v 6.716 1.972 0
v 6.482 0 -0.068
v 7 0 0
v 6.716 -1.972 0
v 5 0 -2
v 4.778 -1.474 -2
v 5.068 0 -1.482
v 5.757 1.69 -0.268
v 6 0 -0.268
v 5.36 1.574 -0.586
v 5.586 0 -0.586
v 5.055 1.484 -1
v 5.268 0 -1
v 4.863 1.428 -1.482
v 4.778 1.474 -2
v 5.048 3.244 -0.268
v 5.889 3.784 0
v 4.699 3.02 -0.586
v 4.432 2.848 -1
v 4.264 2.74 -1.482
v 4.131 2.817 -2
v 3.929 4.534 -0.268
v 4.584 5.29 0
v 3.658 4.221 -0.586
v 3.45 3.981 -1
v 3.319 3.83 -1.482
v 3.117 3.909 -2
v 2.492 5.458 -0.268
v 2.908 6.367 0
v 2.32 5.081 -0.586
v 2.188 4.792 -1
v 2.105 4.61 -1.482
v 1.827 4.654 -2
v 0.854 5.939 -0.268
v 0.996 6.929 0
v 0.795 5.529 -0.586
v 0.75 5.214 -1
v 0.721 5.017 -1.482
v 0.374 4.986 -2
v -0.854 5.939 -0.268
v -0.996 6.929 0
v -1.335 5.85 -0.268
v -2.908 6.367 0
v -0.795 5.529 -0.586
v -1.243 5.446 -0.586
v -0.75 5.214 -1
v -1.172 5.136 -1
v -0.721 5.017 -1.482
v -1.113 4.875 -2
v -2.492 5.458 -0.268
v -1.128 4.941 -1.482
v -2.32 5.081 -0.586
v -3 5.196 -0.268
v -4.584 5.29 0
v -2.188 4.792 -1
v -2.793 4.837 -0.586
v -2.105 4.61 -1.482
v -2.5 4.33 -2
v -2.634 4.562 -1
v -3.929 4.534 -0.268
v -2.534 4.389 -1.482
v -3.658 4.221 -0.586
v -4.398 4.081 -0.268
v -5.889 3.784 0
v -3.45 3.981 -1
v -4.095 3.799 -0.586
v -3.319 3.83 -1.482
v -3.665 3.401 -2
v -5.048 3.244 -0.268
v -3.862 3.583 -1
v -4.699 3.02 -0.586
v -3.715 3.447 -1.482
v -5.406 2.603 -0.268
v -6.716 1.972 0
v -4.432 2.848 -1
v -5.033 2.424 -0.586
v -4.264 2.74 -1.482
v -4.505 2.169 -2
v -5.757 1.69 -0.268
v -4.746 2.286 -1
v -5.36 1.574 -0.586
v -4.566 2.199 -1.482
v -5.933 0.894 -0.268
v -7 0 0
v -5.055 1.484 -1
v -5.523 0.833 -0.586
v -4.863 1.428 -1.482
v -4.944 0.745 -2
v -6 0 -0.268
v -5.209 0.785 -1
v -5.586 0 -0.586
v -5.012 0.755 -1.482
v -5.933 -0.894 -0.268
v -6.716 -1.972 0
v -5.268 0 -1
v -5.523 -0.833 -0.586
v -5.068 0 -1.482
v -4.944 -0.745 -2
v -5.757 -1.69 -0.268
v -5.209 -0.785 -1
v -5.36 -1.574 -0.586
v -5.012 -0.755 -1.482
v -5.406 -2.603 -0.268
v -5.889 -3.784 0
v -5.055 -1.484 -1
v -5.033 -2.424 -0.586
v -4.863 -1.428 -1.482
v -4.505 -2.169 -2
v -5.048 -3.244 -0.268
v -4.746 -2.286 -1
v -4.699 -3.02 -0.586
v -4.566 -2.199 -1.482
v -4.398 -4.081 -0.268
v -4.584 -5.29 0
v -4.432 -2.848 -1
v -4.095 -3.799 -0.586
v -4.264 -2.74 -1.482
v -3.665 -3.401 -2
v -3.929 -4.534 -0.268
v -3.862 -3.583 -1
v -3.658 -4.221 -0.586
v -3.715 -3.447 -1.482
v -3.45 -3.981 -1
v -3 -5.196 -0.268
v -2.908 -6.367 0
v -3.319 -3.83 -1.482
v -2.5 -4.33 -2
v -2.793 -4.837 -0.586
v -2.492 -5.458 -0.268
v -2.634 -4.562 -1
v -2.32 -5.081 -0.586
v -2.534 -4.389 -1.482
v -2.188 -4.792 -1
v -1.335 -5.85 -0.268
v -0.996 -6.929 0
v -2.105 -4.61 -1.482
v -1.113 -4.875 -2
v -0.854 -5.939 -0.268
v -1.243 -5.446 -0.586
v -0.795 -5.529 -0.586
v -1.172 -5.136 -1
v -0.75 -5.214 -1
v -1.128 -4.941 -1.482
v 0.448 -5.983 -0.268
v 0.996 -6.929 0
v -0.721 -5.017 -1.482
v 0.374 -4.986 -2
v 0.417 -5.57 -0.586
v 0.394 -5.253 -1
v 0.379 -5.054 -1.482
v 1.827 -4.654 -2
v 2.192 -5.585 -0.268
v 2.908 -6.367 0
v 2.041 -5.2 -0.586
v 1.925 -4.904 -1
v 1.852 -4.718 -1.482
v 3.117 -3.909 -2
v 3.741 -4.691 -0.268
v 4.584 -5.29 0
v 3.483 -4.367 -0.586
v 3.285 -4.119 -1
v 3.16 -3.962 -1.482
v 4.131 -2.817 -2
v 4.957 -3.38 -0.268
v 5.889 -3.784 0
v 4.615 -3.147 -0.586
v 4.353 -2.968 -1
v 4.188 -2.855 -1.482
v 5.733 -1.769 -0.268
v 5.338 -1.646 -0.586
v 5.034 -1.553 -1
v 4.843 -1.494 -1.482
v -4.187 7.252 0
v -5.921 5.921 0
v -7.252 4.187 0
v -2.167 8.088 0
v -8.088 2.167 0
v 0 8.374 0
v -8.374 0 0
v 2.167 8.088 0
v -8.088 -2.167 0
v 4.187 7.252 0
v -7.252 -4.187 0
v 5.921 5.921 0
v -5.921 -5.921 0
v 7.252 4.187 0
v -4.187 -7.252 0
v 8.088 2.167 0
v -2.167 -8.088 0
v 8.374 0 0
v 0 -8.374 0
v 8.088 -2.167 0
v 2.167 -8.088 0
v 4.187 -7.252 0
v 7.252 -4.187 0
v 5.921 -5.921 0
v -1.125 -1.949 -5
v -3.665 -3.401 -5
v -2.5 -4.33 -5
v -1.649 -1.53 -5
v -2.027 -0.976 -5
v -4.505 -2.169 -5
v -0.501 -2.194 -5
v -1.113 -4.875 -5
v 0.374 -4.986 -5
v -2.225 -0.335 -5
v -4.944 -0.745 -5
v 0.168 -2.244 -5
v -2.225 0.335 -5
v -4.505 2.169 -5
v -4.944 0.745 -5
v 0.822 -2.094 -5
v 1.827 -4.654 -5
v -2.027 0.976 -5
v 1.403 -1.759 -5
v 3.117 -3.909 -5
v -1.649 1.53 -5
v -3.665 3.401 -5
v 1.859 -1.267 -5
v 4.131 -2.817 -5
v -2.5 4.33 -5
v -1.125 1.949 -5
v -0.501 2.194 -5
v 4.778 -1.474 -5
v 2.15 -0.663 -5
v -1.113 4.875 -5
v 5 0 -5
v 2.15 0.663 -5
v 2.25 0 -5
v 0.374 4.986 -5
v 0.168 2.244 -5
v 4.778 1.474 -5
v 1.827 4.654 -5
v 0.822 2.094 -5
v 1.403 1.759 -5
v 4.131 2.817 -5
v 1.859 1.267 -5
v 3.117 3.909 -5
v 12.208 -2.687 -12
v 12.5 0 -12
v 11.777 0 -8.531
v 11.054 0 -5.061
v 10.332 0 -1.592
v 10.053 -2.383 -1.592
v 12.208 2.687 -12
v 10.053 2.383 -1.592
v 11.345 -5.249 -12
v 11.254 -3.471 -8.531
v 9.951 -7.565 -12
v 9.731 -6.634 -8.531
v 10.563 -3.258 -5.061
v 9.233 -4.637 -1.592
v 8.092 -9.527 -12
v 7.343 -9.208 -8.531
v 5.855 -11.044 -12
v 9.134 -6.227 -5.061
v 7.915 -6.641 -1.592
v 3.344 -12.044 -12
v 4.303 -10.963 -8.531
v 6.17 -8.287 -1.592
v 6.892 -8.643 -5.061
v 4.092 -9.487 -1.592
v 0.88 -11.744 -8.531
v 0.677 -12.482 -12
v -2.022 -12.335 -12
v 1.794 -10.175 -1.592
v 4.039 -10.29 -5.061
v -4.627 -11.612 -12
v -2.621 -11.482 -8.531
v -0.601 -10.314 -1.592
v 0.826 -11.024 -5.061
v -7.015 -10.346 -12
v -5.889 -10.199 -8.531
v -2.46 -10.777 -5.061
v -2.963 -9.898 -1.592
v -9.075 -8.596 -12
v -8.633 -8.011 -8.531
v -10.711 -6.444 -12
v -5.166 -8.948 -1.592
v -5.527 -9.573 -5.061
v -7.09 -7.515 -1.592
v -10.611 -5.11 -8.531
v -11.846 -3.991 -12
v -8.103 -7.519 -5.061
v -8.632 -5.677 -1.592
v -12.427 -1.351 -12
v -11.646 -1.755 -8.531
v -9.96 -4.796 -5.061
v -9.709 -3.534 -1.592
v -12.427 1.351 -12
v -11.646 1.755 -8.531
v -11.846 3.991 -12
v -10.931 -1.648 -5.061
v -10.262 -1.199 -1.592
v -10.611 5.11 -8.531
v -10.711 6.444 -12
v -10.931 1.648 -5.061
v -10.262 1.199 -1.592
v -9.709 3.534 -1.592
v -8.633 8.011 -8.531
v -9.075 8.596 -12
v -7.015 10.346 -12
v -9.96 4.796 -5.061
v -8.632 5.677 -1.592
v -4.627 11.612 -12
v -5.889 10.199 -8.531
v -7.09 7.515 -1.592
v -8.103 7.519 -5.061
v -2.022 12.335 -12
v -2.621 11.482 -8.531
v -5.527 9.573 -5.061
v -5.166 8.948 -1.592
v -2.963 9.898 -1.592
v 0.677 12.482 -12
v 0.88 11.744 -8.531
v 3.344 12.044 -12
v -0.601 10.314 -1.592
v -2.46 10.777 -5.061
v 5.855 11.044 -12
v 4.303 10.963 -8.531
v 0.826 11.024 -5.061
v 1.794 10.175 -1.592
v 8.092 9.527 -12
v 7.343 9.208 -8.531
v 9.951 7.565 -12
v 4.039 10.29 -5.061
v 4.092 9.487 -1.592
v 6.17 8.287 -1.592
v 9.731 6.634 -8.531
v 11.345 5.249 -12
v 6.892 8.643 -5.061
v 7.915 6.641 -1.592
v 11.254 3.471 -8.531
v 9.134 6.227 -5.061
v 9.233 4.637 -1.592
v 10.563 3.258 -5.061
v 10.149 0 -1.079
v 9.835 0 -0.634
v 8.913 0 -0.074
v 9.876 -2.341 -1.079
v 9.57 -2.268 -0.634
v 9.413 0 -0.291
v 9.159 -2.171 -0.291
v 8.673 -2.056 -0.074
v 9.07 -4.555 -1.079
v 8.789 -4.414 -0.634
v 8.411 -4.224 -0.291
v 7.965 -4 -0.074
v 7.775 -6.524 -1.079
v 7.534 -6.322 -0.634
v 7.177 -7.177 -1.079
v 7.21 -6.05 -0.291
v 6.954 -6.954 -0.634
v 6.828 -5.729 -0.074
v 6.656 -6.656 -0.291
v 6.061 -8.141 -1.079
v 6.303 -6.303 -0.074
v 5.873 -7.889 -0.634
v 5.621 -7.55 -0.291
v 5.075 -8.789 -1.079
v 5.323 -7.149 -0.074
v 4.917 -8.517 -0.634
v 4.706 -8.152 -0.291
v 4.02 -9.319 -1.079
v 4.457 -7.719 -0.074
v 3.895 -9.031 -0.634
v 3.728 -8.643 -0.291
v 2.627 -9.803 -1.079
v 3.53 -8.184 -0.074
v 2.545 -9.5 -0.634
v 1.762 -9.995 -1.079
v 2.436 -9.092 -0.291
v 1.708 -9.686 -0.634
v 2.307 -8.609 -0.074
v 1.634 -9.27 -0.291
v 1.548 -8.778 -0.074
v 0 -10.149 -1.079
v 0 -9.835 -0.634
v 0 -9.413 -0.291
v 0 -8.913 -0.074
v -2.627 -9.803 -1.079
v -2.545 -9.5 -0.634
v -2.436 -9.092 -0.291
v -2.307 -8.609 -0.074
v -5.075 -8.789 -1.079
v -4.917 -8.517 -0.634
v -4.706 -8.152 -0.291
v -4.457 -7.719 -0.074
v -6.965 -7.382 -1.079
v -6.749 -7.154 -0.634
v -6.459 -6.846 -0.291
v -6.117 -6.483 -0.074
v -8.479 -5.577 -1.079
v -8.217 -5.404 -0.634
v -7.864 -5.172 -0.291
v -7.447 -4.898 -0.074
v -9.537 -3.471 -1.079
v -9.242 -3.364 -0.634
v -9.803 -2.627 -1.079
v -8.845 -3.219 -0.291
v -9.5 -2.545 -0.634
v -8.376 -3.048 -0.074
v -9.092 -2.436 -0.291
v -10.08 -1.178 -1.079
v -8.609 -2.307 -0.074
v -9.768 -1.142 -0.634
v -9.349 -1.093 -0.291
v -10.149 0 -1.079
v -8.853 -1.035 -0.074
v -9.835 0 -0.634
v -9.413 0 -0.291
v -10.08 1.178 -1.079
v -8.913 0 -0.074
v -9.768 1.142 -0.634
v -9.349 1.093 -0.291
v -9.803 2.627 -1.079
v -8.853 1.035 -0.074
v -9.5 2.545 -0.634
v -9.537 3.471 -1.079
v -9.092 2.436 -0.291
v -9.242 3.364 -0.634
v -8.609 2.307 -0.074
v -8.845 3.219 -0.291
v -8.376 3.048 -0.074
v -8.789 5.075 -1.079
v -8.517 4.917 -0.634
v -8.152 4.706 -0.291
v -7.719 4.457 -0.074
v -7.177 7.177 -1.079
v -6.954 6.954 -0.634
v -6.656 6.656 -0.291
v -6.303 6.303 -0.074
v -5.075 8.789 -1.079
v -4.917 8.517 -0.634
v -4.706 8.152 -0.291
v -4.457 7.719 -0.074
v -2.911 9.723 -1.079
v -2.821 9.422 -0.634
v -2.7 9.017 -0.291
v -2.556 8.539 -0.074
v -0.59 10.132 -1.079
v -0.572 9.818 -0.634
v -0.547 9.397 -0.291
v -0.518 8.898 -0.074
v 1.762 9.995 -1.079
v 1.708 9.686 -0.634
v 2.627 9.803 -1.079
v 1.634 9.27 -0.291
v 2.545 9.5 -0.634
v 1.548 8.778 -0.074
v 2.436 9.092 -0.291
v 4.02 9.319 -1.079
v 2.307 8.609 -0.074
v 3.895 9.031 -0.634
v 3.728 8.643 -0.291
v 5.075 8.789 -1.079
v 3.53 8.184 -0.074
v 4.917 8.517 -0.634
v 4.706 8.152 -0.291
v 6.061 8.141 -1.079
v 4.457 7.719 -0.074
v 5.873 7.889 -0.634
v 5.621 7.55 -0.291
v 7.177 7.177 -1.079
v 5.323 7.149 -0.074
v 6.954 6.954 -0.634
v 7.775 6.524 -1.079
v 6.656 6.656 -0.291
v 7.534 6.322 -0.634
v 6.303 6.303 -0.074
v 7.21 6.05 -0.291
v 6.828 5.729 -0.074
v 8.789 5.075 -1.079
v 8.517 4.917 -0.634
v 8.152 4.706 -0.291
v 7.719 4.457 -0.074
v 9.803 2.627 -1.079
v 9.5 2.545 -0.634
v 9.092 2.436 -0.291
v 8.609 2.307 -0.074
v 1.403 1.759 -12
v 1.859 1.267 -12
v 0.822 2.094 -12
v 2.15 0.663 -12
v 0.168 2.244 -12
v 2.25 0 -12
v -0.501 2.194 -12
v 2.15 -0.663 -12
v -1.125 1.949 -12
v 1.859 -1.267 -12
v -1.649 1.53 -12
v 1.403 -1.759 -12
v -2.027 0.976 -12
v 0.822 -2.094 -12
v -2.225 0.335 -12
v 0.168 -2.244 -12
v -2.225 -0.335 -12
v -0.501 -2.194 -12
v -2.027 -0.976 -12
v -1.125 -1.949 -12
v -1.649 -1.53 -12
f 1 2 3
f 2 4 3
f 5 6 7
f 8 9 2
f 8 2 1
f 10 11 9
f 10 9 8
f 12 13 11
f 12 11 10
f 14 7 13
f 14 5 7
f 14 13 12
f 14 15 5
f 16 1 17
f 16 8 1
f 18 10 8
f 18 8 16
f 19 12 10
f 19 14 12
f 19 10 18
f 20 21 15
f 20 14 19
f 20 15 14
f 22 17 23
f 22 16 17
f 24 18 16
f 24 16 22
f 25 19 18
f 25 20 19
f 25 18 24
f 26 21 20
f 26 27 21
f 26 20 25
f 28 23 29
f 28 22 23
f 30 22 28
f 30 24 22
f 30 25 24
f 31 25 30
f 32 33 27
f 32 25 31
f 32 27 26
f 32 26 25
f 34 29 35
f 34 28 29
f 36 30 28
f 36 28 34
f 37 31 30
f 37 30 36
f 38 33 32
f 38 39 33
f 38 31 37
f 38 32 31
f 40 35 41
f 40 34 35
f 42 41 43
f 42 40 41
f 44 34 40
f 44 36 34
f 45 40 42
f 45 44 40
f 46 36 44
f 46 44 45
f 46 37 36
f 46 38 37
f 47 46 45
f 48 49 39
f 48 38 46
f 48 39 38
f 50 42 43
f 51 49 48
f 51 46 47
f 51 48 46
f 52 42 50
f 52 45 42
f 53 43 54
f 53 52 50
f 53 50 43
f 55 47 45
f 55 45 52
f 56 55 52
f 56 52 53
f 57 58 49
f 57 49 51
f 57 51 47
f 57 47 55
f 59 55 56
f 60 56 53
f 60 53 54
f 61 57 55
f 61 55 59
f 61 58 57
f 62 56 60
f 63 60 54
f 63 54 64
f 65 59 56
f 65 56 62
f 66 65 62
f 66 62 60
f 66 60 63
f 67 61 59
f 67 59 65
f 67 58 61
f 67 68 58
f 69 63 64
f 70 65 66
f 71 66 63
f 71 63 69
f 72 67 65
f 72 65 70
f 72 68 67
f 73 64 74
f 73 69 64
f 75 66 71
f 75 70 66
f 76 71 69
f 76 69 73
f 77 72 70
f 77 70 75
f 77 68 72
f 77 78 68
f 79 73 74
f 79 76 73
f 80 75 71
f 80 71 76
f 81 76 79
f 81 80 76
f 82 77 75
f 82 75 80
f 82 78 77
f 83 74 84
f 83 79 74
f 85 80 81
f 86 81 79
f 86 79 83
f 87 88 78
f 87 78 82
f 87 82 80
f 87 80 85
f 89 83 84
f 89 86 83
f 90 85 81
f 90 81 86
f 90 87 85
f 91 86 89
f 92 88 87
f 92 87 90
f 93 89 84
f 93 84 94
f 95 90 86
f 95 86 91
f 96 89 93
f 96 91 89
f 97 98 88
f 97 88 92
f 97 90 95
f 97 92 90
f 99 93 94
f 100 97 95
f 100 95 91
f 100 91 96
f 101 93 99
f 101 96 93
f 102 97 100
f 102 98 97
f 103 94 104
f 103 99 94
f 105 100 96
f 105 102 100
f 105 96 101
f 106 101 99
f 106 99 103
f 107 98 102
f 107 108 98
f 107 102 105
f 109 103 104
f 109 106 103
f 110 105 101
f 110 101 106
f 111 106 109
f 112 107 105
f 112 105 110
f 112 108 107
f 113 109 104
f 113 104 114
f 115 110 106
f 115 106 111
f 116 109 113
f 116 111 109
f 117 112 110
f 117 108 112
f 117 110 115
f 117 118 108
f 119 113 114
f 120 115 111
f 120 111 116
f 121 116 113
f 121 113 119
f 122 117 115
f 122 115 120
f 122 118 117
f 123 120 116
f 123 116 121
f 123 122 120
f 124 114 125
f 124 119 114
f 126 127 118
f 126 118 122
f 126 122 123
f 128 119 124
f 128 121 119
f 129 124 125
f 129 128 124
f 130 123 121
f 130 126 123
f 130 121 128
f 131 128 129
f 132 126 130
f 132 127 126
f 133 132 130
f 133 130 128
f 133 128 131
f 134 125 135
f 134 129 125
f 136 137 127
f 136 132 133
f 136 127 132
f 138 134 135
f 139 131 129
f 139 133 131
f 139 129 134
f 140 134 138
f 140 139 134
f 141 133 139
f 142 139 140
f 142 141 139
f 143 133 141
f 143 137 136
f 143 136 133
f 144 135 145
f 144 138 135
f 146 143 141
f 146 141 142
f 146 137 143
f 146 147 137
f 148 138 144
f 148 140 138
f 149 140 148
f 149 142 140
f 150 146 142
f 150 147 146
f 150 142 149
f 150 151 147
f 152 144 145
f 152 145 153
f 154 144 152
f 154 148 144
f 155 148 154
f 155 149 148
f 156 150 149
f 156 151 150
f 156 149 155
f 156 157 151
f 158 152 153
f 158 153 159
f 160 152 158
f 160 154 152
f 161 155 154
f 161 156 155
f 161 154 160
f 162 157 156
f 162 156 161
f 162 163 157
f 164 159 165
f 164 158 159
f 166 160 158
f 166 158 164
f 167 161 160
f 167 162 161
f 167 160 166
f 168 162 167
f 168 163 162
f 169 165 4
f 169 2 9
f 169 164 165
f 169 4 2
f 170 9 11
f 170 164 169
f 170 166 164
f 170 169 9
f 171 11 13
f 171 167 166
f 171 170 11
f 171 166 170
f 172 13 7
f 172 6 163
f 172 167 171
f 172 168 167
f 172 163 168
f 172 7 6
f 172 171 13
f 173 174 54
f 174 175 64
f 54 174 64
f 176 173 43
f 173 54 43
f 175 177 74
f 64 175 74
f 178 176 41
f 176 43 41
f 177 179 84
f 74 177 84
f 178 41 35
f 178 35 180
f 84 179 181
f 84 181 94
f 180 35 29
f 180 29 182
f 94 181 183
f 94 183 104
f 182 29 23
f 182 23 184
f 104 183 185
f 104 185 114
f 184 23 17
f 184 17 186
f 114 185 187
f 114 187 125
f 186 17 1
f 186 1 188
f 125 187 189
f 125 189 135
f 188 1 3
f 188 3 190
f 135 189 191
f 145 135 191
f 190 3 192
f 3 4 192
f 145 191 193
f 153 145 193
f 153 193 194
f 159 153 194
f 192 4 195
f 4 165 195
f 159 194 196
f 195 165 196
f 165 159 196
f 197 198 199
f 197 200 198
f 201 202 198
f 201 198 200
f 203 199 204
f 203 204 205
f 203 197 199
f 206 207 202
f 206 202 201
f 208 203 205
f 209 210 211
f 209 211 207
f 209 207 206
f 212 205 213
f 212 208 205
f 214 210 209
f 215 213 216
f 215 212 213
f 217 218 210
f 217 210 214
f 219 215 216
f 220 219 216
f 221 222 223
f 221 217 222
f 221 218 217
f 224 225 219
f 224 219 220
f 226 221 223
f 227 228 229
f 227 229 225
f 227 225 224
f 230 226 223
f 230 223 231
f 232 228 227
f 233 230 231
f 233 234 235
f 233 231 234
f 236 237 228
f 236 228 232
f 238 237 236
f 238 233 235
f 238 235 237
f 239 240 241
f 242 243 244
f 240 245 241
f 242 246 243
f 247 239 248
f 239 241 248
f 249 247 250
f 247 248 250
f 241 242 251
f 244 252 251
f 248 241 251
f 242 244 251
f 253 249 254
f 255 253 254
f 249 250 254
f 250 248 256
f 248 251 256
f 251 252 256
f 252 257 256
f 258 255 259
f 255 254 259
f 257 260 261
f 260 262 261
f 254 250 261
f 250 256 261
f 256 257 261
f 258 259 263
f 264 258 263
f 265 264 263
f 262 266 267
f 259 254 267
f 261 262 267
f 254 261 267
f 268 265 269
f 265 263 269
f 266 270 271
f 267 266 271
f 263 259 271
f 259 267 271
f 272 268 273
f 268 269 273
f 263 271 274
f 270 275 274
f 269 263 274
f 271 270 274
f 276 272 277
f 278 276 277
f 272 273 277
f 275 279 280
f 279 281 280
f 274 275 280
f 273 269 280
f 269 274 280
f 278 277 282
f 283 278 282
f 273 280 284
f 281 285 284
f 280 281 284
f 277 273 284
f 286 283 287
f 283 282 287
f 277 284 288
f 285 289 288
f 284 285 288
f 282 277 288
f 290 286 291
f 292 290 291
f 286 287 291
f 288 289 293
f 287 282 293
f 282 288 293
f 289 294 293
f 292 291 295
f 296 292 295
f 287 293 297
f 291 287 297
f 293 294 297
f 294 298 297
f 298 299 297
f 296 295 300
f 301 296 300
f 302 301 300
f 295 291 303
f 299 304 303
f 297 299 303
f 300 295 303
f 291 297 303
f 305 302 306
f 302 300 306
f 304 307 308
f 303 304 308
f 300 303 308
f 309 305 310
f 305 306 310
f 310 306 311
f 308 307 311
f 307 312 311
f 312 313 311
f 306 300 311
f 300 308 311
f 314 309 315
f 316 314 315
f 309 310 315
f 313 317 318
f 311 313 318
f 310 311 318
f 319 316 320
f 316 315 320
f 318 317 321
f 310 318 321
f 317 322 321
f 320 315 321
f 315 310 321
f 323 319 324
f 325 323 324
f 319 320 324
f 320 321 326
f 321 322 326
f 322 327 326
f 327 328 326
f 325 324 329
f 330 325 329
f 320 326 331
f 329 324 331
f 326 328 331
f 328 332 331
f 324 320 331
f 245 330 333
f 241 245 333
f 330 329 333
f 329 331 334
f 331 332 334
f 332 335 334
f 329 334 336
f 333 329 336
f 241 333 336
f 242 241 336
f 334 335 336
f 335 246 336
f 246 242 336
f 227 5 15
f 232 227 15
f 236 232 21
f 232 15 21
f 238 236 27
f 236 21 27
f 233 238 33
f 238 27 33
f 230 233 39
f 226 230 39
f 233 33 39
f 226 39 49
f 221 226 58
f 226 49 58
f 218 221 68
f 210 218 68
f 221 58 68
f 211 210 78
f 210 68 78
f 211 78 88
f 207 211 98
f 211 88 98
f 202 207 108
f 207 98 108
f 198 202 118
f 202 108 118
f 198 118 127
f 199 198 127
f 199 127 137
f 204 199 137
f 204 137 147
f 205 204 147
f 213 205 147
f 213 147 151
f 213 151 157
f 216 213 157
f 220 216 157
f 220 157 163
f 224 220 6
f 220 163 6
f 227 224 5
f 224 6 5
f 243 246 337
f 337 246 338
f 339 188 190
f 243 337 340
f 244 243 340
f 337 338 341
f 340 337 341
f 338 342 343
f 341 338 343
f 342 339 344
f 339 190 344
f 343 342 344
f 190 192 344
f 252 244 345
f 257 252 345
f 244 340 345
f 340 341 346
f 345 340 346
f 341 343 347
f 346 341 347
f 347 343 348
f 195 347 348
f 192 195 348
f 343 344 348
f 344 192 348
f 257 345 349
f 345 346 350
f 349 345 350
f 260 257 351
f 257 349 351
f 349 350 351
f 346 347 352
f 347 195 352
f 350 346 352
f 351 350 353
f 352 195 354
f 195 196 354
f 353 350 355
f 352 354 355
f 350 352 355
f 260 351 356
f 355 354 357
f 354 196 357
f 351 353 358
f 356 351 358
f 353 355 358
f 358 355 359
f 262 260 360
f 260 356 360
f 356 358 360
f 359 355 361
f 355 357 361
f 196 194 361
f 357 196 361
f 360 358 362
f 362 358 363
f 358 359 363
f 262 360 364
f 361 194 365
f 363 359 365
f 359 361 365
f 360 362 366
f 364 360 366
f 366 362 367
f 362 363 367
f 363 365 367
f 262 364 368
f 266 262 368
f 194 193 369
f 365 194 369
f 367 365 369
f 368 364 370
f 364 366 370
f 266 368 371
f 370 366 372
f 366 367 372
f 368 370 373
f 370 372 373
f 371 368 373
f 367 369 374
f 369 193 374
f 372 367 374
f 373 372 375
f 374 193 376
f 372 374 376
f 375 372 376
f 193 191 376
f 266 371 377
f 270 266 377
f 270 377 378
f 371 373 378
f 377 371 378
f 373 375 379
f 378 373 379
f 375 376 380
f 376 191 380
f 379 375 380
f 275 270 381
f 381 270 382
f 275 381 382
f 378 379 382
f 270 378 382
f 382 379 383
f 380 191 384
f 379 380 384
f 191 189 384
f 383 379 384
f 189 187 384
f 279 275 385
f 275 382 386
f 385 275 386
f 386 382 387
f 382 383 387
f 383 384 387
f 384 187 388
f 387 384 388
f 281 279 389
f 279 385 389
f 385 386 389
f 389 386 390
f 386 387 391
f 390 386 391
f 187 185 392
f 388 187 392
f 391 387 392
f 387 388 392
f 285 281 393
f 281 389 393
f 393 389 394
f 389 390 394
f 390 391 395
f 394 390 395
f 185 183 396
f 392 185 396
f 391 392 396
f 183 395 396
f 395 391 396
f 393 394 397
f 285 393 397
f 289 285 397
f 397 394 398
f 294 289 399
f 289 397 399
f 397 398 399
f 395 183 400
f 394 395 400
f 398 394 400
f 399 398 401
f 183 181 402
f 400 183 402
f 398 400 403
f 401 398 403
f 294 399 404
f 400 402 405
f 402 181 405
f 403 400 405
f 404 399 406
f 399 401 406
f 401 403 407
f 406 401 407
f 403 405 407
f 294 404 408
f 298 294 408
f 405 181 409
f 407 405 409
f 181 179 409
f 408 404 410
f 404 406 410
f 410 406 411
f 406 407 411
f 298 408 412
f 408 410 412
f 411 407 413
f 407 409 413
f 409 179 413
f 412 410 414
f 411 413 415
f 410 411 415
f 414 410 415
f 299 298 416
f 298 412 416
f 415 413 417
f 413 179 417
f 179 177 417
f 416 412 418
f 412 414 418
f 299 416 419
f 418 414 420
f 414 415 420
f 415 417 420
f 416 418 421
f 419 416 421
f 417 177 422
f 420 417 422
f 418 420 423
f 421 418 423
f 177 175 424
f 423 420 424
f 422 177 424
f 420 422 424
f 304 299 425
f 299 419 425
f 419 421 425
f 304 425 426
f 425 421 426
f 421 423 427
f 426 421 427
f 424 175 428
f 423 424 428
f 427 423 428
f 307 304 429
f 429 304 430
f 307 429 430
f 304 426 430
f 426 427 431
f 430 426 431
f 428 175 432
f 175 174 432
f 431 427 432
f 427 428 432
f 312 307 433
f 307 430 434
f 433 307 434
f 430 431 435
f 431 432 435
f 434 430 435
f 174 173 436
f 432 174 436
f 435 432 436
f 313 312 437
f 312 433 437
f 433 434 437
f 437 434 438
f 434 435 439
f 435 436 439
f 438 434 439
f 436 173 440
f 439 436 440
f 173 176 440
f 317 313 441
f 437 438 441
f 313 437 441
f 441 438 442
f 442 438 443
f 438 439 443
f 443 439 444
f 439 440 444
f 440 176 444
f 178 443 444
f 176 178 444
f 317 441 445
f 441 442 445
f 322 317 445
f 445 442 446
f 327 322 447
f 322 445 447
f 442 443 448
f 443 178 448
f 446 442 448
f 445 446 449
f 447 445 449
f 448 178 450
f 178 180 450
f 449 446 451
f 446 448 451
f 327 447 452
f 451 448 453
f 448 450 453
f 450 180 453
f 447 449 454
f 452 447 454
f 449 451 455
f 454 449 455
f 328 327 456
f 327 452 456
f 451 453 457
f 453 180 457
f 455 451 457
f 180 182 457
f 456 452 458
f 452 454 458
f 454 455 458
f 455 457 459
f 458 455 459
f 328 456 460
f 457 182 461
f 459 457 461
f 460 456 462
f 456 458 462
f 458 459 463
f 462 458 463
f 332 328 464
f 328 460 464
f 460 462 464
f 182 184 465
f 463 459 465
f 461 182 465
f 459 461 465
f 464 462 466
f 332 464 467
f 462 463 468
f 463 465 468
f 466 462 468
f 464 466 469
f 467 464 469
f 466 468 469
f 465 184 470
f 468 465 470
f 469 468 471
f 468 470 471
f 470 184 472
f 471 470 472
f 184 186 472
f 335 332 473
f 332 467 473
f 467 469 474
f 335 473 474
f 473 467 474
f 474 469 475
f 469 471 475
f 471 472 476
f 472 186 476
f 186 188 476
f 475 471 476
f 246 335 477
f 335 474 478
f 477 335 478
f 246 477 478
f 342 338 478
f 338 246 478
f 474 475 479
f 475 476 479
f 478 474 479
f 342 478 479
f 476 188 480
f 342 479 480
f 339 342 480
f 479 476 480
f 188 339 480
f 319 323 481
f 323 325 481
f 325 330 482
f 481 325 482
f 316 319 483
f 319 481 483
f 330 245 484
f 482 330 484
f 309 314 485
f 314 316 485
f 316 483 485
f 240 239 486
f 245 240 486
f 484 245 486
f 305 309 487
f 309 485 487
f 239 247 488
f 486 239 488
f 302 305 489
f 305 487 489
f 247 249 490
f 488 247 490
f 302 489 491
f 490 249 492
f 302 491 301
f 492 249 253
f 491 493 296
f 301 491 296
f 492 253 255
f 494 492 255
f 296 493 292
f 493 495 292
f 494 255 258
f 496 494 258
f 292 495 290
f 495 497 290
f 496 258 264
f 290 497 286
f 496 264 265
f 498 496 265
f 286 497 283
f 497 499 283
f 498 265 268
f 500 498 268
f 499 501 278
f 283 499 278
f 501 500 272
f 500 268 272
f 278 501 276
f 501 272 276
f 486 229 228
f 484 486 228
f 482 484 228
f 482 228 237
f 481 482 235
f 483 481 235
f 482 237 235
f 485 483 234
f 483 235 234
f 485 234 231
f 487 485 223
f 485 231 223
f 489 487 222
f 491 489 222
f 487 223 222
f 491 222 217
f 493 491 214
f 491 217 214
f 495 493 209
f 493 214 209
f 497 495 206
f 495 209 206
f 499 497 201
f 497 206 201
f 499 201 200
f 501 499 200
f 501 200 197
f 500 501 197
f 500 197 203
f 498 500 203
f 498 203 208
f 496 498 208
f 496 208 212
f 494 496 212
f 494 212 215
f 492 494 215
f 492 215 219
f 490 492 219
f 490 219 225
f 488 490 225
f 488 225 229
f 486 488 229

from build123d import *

# Parameters (mm, degrees)
ENL_V_MAT_EXTRU_1_REACH = 23.366
ESQUISSE2_R             = 2.25
ESQUISSE3_R             = 5
ENL_V_MAT_EXTRU_2_DEPTH = 5
CONG_1_R                = 2


with BuildPart() as part:
    # Esquisse1 → Révolution1 (revolve)
    with BuildSketch(Plane(origin=(0, 0, 0), x_dir=(0, 0, -1), z_dir=(1, 0, 0)), mode=Mode.PRIVATE) as r_volution1_sk:
        Polygon((0, 0), (12, 0), (12, 12.5), (0, 10), align=None)
    revolve(r_volution1_sk.sketch.rotate(Axis((0, 0, 0), (0, 0, -1)), 90), axis=Axis((0, 0, 0), (0, 0, -1)))

    # Esquisse2 → Enlèv. mat.-Extru.1 (cut, up to next)
    with BuildSketch(Plane.XY, mode=Mode.PRIVATE) as enl_v_mat_extru_1_sk1:
        Circle(ESQUISSE2_R)
    enl_v_mat_extru_1_tool1 = extrude(enl_v_mat_extru_1_sk1.sketch, amount=-ENL_V_MAT_EXTRU_1_REACH, mode=Mode.PRIVATE) & part.part
    add(enl_v_mat_extru_1_tool1.solids().sort_by_distance((0, 0, 0))[0], mode=Mode.SUBTRACT)

    # Esquisse3 → Enlèv. mat.-Extru.2 (cut)
    with BuildSketch(Plane.XY):
        Circle(ESQUISSE3_R)
    extrude(amount=-ENL_V_MAT_EXTRU_2_DEPTH, mode=Mode.SUBTRACT)

    # Congé1
    cong_1_edges = [part.edges().sort_by_distance(p)[0] for p in [
        (-5, 0, 0),
        (-10, 0, 0),
    ]]
    fillet(cong_1_edges, radius=CONG_1_R)


solid = part.part
